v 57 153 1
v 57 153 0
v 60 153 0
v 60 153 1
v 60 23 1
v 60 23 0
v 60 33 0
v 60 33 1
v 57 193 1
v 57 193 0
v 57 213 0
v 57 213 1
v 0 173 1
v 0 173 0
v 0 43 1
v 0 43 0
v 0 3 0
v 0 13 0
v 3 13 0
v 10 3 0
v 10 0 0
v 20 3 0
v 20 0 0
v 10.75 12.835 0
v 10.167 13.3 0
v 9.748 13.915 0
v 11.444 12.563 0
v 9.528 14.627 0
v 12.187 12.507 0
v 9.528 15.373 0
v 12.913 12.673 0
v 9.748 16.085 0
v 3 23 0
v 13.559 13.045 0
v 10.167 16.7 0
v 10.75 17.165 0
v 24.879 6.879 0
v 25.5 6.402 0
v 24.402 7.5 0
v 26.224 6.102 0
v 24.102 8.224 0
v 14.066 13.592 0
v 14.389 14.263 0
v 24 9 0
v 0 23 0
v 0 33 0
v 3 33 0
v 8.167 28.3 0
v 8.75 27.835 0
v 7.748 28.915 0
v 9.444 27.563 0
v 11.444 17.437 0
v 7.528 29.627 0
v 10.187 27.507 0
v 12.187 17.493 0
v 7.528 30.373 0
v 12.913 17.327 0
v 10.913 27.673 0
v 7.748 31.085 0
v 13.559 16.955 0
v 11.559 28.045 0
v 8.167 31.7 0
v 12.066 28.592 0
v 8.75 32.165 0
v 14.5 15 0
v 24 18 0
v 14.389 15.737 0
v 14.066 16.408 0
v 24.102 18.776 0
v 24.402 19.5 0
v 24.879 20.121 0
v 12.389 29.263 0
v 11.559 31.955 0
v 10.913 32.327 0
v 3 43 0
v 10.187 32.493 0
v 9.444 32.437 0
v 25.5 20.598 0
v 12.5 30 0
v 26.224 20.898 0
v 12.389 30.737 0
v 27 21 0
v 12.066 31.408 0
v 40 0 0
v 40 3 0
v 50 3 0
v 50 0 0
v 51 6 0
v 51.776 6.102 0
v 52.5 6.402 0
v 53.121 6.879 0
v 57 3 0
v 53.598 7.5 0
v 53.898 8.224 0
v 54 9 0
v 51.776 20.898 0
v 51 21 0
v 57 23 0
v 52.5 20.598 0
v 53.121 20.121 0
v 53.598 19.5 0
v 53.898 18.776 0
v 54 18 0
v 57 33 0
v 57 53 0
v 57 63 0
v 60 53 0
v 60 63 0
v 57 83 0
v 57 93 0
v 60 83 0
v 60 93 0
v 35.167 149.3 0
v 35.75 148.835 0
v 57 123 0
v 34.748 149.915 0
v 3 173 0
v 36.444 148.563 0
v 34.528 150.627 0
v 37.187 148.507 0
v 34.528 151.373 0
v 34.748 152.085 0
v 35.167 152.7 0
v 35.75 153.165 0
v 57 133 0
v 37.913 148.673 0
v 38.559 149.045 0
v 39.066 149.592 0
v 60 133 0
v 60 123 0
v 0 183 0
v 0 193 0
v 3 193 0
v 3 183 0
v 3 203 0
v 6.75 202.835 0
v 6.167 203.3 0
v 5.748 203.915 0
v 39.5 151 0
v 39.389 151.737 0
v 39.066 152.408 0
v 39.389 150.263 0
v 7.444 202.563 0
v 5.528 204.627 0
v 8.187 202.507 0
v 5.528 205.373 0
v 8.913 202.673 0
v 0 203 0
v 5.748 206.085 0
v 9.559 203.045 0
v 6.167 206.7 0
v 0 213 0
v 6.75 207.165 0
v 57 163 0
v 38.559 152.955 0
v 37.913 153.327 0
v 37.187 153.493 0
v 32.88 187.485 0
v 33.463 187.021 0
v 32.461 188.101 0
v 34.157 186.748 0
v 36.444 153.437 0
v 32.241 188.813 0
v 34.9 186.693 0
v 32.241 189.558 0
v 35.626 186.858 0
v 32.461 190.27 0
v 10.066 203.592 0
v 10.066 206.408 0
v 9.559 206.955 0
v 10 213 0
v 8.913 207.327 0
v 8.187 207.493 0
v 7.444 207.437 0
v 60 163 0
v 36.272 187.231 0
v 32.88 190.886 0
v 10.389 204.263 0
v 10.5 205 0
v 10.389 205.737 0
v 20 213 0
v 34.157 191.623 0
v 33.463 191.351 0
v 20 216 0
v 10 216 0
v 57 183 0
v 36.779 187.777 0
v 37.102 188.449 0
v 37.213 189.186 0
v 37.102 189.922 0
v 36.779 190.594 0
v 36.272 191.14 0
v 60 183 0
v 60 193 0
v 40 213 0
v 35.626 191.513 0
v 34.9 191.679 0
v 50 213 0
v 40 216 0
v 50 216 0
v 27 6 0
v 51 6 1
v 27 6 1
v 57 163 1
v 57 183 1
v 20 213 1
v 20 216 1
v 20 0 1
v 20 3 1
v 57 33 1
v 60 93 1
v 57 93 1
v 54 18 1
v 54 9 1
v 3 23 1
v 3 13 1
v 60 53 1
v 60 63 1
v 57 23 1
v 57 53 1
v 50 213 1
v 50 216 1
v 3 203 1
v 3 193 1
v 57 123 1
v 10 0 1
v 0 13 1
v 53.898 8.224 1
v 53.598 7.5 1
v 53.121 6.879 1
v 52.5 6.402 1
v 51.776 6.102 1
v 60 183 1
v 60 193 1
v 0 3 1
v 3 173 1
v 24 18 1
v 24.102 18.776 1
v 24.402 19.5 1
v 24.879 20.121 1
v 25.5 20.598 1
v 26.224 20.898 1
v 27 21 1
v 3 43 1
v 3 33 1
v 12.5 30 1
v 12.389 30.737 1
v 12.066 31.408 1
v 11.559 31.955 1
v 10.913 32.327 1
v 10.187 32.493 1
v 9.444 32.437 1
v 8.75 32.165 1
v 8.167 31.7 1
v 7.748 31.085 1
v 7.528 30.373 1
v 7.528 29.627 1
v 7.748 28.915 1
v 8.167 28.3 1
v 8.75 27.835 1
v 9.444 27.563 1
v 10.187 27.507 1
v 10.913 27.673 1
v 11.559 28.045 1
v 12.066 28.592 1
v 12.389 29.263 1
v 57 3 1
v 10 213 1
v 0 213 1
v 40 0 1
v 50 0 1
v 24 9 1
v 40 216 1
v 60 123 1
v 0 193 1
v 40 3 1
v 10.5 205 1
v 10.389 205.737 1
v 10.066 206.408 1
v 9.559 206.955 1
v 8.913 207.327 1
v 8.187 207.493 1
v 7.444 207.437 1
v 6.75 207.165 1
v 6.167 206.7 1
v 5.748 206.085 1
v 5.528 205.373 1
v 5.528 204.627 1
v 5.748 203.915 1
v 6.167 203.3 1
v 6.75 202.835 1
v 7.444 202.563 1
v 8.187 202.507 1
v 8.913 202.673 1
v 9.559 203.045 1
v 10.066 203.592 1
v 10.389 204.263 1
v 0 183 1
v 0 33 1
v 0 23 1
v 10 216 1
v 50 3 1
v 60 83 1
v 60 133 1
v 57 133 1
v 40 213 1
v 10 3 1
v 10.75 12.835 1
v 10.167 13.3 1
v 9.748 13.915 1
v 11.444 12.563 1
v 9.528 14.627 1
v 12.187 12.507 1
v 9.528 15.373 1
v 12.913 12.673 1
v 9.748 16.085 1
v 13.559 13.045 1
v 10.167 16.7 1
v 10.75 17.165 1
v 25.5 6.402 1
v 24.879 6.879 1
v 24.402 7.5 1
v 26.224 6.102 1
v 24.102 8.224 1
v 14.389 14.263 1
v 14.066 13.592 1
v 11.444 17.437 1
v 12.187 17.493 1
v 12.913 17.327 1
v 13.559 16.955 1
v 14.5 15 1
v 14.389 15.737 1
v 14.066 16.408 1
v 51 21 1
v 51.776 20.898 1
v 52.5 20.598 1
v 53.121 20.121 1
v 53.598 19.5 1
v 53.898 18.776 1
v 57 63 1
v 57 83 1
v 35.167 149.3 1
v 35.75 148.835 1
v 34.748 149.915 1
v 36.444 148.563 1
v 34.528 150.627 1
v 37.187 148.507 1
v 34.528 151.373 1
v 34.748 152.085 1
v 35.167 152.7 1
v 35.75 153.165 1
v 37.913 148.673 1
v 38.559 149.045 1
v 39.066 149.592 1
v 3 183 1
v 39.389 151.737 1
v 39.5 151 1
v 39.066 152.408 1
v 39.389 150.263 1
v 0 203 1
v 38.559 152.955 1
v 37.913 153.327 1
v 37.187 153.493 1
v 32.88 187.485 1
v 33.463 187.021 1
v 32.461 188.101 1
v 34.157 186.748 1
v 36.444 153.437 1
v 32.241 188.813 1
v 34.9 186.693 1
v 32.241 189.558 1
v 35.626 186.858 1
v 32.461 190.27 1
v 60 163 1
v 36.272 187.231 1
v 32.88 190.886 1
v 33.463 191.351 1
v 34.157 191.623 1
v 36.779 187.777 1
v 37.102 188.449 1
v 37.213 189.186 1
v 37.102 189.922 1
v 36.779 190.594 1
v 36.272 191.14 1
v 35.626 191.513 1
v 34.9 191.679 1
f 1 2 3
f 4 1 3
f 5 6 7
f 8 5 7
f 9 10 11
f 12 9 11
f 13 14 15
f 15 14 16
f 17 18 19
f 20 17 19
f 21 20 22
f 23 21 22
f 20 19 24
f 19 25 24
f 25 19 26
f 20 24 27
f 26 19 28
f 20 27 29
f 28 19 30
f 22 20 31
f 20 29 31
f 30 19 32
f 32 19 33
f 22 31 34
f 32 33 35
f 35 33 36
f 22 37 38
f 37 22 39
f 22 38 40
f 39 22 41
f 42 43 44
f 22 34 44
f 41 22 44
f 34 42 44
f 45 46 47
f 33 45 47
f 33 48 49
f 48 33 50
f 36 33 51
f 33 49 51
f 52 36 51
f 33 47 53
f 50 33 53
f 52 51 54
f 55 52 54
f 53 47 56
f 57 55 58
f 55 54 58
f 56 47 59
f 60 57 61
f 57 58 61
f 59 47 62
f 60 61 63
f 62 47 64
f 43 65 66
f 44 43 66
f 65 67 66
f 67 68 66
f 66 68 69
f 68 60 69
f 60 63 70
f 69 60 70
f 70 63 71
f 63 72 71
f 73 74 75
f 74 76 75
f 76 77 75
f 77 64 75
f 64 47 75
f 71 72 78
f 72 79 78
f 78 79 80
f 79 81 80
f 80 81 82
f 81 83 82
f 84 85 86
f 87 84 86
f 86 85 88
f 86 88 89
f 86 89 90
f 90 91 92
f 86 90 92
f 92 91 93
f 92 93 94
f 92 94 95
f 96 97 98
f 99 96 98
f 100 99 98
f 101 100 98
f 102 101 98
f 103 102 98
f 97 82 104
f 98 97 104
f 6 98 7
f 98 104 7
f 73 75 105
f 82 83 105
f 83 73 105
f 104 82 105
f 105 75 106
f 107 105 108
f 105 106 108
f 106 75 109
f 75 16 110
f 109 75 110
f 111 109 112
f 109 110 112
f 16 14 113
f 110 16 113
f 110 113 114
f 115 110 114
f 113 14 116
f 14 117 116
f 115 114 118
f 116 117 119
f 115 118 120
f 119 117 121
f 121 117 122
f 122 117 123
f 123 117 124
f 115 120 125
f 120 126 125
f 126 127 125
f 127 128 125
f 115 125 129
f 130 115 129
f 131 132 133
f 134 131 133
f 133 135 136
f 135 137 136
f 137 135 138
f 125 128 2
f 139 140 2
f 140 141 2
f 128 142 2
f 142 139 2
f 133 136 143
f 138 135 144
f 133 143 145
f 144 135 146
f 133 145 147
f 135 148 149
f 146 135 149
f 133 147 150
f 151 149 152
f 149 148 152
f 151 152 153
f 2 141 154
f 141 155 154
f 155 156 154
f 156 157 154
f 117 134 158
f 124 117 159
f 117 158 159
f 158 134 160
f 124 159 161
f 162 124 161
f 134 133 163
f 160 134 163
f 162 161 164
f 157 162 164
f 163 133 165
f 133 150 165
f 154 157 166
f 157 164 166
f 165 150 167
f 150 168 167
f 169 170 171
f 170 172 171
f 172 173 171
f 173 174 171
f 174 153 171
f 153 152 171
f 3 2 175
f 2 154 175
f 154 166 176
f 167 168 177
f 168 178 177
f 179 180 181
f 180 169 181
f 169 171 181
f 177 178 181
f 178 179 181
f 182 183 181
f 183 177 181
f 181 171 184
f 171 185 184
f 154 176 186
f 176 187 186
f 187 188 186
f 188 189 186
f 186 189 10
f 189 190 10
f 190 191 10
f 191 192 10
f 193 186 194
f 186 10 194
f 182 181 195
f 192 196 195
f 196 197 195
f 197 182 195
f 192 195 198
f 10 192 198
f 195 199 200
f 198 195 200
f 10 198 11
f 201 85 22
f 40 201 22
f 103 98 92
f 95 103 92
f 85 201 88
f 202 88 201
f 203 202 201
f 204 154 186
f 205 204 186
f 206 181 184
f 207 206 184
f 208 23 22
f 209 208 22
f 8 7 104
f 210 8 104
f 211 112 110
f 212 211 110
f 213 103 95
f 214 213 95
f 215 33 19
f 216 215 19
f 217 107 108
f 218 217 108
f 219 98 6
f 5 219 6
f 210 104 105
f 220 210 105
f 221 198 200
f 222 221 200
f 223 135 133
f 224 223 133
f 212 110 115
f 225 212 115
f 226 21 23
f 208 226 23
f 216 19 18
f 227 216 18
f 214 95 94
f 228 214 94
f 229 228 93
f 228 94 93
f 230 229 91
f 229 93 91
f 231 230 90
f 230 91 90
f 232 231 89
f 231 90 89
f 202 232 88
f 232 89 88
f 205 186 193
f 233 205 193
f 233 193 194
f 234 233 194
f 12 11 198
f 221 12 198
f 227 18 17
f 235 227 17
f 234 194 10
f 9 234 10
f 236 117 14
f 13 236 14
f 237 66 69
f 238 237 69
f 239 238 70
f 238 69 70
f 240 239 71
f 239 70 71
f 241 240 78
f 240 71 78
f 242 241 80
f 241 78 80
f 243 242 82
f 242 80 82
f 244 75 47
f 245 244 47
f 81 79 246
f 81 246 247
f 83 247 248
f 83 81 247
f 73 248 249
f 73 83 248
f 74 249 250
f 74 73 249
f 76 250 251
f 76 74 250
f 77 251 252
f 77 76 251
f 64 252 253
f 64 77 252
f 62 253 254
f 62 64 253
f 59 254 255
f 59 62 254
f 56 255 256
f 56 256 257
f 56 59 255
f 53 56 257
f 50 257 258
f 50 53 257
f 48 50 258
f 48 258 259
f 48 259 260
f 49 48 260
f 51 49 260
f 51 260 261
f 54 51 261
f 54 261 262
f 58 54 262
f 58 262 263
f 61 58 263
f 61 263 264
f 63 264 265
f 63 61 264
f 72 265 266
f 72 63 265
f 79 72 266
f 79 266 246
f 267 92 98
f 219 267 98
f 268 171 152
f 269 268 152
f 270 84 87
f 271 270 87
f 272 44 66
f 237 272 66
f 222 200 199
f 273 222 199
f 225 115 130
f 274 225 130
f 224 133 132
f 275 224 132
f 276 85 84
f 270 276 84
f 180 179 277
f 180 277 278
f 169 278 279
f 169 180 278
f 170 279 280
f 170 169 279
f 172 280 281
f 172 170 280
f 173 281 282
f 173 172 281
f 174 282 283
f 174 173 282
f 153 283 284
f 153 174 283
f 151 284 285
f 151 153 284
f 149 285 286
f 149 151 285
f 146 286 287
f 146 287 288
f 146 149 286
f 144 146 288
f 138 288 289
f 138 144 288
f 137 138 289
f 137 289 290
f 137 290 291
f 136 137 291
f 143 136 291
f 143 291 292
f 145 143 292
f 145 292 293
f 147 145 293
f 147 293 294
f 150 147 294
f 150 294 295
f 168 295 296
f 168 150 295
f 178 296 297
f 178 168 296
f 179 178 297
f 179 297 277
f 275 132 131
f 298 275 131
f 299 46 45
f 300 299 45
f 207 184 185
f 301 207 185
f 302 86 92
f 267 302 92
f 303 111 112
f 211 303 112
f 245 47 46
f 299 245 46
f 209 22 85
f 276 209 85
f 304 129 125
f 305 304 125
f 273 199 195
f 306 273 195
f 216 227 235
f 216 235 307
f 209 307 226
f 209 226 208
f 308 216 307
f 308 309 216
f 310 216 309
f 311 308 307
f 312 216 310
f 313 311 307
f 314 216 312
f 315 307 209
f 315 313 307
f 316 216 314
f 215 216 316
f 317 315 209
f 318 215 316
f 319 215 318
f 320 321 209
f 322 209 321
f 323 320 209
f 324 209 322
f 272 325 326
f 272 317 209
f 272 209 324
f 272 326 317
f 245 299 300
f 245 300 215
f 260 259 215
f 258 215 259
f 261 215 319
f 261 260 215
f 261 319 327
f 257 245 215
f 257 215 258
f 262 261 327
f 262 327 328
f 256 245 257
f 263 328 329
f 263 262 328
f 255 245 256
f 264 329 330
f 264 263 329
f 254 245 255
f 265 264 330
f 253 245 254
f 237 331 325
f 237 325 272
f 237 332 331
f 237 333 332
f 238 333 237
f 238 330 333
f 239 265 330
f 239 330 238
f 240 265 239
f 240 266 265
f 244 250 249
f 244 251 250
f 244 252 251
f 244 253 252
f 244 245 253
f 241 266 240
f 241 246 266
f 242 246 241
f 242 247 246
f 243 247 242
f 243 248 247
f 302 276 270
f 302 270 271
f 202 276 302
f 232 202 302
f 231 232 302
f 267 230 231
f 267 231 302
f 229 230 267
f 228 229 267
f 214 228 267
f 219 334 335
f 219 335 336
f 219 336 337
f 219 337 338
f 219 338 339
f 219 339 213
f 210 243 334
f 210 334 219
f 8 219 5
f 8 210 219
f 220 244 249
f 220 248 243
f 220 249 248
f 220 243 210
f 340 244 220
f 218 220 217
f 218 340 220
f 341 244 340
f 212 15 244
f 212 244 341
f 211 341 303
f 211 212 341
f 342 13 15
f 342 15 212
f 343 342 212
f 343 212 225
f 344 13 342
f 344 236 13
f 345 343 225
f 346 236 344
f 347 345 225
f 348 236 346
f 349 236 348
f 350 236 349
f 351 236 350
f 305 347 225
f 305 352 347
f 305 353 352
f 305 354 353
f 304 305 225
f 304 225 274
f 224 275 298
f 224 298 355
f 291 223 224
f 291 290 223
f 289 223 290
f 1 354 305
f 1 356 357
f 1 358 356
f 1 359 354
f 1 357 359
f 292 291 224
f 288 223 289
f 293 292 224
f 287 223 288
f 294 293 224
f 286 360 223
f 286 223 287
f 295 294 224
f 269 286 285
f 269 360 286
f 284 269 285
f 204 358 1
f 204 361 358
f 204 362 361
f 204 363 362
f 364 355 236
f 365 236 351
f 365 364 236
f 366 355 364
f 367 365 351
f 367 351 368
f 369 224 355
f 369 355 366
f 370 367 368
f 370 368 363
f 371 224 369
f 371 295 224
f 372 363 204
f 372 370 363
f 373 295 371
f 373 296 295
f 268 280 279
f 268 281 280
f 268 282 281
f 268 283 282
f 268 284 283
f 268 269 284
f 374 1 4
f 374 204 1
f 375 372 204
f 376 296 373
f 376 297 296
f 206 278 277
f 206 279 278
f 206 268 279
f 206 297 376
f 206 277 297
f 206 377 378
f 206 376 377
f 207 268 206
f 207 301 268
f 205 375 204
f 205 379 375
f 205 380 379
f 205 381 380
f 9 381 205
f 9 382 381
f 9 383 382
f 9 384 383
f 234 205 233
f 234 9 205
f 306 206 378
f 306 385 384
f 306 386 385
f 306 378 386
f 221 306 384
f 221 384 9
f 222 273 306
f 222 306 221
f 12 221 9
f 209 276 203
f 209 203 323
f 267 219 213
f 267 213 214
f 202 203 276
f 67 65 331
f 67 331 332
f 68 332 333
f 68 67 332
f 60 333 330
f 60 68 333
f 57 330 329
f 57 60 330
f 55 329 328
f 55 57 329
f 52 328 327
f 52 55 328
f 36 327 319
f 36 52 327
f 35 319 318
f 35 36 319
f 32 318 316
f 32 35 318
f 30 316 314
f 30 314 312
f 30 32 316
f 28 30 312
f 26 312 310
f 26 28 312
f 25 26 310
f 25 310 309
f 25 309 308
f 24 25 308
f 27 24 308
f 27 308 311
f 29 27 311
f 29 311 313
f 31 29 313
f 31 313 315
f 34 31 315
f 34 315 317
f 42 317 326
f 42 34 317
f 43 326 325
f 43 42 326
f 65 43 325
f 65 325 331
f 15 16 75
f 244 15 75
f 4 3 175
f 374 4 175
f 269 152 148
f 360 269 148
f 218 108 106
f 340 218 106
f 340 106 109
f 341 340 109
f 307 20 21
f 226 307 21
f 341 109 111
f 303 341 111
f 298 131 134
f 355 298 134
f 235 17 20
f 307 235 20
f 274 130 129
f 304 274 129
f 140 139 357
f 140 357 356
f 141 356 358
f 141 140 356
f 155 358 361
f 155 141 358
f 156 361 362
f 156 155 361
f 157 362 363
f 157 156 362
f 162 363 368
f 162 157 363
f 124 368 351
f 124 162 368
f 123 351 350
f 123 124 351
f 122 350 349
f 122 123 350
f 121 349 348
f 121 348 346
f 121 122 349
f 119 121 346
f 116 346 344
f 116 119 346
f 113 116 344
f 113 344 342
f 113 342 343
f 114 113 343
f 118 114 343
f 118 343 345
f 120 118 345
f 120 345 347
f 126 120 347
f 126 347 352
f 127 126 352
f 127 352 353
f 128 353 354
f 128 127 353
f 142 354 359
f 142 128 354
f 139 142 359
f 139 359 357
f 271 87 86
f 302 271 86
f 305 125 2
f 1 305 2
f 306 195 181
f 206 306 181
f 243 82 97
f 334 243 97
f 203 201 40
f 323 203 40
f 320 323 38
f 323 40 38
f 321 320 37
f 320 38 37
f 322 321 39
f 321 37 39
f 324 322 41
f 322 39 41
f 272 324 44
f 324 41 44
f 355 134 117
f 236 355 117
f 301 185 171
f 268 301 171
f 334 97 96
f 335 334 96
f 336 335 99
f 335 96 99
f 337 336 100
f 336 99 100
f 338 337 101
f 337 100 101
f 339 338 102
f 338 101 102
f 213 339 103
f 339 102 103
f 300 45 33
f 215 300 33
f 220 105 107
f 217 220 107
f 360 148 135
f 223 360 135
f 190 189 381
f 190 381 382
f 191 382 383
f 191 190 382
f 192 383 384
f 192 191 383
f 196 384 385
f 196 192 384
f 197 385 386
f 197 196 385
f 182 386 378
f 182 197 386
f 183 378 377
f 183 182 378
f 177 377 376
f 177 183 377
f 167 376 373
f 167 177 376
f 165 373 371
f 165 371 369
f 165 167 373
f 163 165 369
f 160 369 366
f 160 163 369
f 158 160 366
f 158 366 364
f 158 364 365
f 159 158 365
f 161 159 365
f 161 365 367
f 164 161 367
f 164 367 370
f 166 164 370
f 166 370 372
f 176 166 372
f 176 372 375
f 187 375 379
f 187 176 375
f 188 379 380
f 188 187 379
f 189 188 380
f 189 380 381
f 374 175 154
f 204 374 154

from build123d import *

# Parameters (mm, degrees)
SKETCH1_R           = 2.5
BOSS_EXTRUDE2_DEPTH = 1


with BuildPart() as part:
    # Sketch1 → Boss-Extrude2 (new body)
    with BuildSketch(Plane.XY):
        Polygon((3, 173), (0, 173), (0, 43), (3, 43), (3, 33), (0, 33), (0, 23), (3, 23), (3, 13), (0, 13), (0, 3), (10, 3), (10, 0), (20, 0), (20, 3), (40, 3), (40, 0), (50, 0), (50, 3), (57, 3), (57, 23), (60, 23), (60, 33), (57, 33), (57, 53), (60, 53), (60, 63), (57, 63), (57, 83), (60, 83), (60, 93), (57, 93), (57, 123), (60, 123), (60, 133), (57, 133), (57, 153), (60, 153), (60, 163), (57, 163), (57, 183), (60, 183), (60, 193), (57, 193), (57, 213), (50, 213), (50, 216), (40, 216), (40, 213), (20, 213), (20, 216), (10, 216), (10, 213), (0, 213), (0, 203), (3, 203), (3, 193), (0, 193), (0, 183), (3, 183), align=None)
        with Locations((12, 15)):
            Circle(SKETCH1_R, mode=Mode.SUBTRACT)
        with Locations((10, 30)):
            Circle(SKETCH1_R, mode=Mode.SUBTRACT)
        with BuildLine():
            ThreePointArc((24, 18), (24.878679656, 20.121320344), (27, 21))
            Line((27, 21), (51, 21))
            ThreePointArc((51, 21), (53.121320344, 20.121320344), (54, 18))
            Line((54, 18), (54, 9))
            ThreePointArc((54, 9), (53.121320344, 6.878679656), (51, 6))
            Line((51, 6), (27, 6))
            ThreePointArc((27, 6), (24.878679656, 6.878679656), (24, 9))
            Line((24, 9), (24, 18))
        make_face(mode=Mode.SUBTRACT)
        with Locations((8, 205)):
            Circle(SKETCH1_R, mode=Mode.SUBTRACT)
        with Locations((37, 151)):
            Circle(SKETCH1_R, mode=Mode.SUBTRACT)
        with Locations((34.713021846, 189.185576425)):
            Circle(SKETCH1_R, mode=Mode.SUBTRACT)
    extrude(amount=BOSS_EXTRUDE2_DEPTH)


solid = part.part
